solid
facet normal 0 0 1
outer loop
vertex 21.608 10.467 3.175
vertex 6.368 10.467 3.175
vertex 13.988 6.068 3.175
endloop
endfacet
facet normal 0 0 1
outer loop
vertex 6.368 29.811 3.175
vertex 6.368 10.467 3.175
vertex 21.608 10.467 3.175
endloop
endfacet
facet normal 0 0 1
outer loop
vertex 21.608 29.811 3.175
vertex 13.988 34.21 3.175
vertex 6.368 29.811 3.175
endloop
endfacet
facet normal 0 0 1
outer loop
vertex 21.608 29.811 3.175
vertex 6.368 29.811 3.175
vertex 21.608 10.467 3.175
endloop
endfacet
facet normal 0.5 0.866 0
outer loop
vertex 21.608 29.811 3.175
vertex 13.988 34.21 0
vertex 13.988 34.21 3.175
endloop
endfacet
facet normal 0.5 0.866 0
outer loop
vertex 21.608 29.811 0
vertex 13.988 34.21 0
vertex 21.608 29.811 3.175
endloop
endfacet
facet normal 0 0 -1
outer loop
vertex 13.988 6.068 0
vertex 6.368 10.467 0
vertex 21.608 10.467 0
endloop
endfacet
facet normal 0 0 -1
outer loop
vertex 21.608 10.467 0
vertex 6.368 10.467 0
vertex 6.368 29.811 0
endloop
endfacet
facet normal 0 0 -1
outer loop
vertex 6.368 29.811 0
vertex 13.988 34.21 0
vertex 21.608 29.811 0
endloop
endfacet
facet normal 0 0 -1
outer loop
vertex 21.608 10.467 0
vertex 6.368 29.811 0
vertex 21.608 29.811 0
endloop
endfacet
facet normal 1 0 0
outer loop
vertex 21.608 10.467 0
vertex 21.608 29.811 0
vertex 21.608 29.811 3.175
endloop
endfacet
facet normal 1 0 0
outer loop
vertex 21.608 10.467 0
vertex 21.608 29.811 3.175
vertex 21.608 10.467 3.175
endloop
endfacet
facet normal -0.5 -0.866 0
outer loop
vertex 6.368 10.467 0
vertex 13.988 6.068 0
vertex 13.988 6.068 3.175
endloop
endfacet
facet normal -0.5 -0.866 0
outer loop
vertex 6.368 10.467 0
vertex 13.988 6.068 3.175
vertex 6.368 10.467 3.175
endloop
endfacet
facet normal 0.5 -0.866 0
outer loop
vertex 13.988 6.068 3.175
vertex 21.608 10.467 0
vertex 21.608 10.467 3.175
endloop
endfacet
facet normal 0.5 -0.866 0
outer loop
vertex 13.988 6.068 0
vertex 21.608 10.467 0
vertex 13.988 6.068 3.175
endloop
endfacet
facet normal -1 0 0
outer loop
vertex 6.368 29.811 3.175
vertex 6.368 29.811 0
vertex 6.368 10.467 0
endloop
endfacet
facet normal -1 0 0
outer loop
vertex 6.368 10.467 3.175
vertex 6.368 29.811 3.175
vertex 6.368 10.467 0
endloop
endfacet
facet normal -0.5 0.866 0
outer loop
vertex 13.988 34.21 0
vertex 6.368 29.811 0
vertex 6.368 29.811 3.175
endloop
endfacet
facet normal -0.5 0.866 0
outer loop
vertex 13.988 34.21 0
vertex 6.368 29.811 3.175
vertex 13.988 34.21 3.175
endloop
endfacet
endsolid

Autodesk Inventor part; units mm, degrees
ref_plane "YZ Plane" through (0, 0, 0) normal (1, 0, 0) x (0, 1, 0)
ref_plane "XZ Plane" through (0, 0, 0) normal (0, 1, 0) x (-1, 0, 0)
ref_plane "XY Plane" through (0, 0, 0) normal (0, 0, 1) x (1, 0, 0)
sketch "Sketch1" plane through (0, 0, 0) normal (0, 0, 1) x (1, 0, 0)
  line L0 (21.6079, 10.4672) -> (13.9879, 6.0678)
  line L1 (13.9879, 6.0678) -> (6.3679, 10.4672)
  line L2 (6.3679, 29.8109) -> (13.9879, 34.2103)
  line L3 (13.9879, 34.2103) -> (21.6079, 29.8109)
  line L4 (6.3679, 29.8109) -> (6.3679, 10.4672)
  line L5 (21.6079, 29.8109) -> (21.6079, 10.4672)
  point P0 (0, 0)
  point P1 (13.9879, 20.1391)
  dimension "d2" = 28.1426
  dimension "d3" = 15.24
extrude "Extrusion1" add sketch "Sketch1" along normal blind 3.175
sketch "Sketch2" plane through (0, 0, 3.175) normal (0, 0, 1) x (1, 0, 0)
  line L0 (7.1627, 16.7783) -> (25.4618, 16.7783) construction
  line L1 (25.4618, 16.7783) -> (25.4618, 11.2346) construction
  line L2 (25.4618, 11.2346) -> (7.1627, 11.2346) construction
  line L3 (7.1627, 11.2346) -> (7.1627, 16.7783) construction
  point P0 (0, 0)
properties part number "Academies logo"
